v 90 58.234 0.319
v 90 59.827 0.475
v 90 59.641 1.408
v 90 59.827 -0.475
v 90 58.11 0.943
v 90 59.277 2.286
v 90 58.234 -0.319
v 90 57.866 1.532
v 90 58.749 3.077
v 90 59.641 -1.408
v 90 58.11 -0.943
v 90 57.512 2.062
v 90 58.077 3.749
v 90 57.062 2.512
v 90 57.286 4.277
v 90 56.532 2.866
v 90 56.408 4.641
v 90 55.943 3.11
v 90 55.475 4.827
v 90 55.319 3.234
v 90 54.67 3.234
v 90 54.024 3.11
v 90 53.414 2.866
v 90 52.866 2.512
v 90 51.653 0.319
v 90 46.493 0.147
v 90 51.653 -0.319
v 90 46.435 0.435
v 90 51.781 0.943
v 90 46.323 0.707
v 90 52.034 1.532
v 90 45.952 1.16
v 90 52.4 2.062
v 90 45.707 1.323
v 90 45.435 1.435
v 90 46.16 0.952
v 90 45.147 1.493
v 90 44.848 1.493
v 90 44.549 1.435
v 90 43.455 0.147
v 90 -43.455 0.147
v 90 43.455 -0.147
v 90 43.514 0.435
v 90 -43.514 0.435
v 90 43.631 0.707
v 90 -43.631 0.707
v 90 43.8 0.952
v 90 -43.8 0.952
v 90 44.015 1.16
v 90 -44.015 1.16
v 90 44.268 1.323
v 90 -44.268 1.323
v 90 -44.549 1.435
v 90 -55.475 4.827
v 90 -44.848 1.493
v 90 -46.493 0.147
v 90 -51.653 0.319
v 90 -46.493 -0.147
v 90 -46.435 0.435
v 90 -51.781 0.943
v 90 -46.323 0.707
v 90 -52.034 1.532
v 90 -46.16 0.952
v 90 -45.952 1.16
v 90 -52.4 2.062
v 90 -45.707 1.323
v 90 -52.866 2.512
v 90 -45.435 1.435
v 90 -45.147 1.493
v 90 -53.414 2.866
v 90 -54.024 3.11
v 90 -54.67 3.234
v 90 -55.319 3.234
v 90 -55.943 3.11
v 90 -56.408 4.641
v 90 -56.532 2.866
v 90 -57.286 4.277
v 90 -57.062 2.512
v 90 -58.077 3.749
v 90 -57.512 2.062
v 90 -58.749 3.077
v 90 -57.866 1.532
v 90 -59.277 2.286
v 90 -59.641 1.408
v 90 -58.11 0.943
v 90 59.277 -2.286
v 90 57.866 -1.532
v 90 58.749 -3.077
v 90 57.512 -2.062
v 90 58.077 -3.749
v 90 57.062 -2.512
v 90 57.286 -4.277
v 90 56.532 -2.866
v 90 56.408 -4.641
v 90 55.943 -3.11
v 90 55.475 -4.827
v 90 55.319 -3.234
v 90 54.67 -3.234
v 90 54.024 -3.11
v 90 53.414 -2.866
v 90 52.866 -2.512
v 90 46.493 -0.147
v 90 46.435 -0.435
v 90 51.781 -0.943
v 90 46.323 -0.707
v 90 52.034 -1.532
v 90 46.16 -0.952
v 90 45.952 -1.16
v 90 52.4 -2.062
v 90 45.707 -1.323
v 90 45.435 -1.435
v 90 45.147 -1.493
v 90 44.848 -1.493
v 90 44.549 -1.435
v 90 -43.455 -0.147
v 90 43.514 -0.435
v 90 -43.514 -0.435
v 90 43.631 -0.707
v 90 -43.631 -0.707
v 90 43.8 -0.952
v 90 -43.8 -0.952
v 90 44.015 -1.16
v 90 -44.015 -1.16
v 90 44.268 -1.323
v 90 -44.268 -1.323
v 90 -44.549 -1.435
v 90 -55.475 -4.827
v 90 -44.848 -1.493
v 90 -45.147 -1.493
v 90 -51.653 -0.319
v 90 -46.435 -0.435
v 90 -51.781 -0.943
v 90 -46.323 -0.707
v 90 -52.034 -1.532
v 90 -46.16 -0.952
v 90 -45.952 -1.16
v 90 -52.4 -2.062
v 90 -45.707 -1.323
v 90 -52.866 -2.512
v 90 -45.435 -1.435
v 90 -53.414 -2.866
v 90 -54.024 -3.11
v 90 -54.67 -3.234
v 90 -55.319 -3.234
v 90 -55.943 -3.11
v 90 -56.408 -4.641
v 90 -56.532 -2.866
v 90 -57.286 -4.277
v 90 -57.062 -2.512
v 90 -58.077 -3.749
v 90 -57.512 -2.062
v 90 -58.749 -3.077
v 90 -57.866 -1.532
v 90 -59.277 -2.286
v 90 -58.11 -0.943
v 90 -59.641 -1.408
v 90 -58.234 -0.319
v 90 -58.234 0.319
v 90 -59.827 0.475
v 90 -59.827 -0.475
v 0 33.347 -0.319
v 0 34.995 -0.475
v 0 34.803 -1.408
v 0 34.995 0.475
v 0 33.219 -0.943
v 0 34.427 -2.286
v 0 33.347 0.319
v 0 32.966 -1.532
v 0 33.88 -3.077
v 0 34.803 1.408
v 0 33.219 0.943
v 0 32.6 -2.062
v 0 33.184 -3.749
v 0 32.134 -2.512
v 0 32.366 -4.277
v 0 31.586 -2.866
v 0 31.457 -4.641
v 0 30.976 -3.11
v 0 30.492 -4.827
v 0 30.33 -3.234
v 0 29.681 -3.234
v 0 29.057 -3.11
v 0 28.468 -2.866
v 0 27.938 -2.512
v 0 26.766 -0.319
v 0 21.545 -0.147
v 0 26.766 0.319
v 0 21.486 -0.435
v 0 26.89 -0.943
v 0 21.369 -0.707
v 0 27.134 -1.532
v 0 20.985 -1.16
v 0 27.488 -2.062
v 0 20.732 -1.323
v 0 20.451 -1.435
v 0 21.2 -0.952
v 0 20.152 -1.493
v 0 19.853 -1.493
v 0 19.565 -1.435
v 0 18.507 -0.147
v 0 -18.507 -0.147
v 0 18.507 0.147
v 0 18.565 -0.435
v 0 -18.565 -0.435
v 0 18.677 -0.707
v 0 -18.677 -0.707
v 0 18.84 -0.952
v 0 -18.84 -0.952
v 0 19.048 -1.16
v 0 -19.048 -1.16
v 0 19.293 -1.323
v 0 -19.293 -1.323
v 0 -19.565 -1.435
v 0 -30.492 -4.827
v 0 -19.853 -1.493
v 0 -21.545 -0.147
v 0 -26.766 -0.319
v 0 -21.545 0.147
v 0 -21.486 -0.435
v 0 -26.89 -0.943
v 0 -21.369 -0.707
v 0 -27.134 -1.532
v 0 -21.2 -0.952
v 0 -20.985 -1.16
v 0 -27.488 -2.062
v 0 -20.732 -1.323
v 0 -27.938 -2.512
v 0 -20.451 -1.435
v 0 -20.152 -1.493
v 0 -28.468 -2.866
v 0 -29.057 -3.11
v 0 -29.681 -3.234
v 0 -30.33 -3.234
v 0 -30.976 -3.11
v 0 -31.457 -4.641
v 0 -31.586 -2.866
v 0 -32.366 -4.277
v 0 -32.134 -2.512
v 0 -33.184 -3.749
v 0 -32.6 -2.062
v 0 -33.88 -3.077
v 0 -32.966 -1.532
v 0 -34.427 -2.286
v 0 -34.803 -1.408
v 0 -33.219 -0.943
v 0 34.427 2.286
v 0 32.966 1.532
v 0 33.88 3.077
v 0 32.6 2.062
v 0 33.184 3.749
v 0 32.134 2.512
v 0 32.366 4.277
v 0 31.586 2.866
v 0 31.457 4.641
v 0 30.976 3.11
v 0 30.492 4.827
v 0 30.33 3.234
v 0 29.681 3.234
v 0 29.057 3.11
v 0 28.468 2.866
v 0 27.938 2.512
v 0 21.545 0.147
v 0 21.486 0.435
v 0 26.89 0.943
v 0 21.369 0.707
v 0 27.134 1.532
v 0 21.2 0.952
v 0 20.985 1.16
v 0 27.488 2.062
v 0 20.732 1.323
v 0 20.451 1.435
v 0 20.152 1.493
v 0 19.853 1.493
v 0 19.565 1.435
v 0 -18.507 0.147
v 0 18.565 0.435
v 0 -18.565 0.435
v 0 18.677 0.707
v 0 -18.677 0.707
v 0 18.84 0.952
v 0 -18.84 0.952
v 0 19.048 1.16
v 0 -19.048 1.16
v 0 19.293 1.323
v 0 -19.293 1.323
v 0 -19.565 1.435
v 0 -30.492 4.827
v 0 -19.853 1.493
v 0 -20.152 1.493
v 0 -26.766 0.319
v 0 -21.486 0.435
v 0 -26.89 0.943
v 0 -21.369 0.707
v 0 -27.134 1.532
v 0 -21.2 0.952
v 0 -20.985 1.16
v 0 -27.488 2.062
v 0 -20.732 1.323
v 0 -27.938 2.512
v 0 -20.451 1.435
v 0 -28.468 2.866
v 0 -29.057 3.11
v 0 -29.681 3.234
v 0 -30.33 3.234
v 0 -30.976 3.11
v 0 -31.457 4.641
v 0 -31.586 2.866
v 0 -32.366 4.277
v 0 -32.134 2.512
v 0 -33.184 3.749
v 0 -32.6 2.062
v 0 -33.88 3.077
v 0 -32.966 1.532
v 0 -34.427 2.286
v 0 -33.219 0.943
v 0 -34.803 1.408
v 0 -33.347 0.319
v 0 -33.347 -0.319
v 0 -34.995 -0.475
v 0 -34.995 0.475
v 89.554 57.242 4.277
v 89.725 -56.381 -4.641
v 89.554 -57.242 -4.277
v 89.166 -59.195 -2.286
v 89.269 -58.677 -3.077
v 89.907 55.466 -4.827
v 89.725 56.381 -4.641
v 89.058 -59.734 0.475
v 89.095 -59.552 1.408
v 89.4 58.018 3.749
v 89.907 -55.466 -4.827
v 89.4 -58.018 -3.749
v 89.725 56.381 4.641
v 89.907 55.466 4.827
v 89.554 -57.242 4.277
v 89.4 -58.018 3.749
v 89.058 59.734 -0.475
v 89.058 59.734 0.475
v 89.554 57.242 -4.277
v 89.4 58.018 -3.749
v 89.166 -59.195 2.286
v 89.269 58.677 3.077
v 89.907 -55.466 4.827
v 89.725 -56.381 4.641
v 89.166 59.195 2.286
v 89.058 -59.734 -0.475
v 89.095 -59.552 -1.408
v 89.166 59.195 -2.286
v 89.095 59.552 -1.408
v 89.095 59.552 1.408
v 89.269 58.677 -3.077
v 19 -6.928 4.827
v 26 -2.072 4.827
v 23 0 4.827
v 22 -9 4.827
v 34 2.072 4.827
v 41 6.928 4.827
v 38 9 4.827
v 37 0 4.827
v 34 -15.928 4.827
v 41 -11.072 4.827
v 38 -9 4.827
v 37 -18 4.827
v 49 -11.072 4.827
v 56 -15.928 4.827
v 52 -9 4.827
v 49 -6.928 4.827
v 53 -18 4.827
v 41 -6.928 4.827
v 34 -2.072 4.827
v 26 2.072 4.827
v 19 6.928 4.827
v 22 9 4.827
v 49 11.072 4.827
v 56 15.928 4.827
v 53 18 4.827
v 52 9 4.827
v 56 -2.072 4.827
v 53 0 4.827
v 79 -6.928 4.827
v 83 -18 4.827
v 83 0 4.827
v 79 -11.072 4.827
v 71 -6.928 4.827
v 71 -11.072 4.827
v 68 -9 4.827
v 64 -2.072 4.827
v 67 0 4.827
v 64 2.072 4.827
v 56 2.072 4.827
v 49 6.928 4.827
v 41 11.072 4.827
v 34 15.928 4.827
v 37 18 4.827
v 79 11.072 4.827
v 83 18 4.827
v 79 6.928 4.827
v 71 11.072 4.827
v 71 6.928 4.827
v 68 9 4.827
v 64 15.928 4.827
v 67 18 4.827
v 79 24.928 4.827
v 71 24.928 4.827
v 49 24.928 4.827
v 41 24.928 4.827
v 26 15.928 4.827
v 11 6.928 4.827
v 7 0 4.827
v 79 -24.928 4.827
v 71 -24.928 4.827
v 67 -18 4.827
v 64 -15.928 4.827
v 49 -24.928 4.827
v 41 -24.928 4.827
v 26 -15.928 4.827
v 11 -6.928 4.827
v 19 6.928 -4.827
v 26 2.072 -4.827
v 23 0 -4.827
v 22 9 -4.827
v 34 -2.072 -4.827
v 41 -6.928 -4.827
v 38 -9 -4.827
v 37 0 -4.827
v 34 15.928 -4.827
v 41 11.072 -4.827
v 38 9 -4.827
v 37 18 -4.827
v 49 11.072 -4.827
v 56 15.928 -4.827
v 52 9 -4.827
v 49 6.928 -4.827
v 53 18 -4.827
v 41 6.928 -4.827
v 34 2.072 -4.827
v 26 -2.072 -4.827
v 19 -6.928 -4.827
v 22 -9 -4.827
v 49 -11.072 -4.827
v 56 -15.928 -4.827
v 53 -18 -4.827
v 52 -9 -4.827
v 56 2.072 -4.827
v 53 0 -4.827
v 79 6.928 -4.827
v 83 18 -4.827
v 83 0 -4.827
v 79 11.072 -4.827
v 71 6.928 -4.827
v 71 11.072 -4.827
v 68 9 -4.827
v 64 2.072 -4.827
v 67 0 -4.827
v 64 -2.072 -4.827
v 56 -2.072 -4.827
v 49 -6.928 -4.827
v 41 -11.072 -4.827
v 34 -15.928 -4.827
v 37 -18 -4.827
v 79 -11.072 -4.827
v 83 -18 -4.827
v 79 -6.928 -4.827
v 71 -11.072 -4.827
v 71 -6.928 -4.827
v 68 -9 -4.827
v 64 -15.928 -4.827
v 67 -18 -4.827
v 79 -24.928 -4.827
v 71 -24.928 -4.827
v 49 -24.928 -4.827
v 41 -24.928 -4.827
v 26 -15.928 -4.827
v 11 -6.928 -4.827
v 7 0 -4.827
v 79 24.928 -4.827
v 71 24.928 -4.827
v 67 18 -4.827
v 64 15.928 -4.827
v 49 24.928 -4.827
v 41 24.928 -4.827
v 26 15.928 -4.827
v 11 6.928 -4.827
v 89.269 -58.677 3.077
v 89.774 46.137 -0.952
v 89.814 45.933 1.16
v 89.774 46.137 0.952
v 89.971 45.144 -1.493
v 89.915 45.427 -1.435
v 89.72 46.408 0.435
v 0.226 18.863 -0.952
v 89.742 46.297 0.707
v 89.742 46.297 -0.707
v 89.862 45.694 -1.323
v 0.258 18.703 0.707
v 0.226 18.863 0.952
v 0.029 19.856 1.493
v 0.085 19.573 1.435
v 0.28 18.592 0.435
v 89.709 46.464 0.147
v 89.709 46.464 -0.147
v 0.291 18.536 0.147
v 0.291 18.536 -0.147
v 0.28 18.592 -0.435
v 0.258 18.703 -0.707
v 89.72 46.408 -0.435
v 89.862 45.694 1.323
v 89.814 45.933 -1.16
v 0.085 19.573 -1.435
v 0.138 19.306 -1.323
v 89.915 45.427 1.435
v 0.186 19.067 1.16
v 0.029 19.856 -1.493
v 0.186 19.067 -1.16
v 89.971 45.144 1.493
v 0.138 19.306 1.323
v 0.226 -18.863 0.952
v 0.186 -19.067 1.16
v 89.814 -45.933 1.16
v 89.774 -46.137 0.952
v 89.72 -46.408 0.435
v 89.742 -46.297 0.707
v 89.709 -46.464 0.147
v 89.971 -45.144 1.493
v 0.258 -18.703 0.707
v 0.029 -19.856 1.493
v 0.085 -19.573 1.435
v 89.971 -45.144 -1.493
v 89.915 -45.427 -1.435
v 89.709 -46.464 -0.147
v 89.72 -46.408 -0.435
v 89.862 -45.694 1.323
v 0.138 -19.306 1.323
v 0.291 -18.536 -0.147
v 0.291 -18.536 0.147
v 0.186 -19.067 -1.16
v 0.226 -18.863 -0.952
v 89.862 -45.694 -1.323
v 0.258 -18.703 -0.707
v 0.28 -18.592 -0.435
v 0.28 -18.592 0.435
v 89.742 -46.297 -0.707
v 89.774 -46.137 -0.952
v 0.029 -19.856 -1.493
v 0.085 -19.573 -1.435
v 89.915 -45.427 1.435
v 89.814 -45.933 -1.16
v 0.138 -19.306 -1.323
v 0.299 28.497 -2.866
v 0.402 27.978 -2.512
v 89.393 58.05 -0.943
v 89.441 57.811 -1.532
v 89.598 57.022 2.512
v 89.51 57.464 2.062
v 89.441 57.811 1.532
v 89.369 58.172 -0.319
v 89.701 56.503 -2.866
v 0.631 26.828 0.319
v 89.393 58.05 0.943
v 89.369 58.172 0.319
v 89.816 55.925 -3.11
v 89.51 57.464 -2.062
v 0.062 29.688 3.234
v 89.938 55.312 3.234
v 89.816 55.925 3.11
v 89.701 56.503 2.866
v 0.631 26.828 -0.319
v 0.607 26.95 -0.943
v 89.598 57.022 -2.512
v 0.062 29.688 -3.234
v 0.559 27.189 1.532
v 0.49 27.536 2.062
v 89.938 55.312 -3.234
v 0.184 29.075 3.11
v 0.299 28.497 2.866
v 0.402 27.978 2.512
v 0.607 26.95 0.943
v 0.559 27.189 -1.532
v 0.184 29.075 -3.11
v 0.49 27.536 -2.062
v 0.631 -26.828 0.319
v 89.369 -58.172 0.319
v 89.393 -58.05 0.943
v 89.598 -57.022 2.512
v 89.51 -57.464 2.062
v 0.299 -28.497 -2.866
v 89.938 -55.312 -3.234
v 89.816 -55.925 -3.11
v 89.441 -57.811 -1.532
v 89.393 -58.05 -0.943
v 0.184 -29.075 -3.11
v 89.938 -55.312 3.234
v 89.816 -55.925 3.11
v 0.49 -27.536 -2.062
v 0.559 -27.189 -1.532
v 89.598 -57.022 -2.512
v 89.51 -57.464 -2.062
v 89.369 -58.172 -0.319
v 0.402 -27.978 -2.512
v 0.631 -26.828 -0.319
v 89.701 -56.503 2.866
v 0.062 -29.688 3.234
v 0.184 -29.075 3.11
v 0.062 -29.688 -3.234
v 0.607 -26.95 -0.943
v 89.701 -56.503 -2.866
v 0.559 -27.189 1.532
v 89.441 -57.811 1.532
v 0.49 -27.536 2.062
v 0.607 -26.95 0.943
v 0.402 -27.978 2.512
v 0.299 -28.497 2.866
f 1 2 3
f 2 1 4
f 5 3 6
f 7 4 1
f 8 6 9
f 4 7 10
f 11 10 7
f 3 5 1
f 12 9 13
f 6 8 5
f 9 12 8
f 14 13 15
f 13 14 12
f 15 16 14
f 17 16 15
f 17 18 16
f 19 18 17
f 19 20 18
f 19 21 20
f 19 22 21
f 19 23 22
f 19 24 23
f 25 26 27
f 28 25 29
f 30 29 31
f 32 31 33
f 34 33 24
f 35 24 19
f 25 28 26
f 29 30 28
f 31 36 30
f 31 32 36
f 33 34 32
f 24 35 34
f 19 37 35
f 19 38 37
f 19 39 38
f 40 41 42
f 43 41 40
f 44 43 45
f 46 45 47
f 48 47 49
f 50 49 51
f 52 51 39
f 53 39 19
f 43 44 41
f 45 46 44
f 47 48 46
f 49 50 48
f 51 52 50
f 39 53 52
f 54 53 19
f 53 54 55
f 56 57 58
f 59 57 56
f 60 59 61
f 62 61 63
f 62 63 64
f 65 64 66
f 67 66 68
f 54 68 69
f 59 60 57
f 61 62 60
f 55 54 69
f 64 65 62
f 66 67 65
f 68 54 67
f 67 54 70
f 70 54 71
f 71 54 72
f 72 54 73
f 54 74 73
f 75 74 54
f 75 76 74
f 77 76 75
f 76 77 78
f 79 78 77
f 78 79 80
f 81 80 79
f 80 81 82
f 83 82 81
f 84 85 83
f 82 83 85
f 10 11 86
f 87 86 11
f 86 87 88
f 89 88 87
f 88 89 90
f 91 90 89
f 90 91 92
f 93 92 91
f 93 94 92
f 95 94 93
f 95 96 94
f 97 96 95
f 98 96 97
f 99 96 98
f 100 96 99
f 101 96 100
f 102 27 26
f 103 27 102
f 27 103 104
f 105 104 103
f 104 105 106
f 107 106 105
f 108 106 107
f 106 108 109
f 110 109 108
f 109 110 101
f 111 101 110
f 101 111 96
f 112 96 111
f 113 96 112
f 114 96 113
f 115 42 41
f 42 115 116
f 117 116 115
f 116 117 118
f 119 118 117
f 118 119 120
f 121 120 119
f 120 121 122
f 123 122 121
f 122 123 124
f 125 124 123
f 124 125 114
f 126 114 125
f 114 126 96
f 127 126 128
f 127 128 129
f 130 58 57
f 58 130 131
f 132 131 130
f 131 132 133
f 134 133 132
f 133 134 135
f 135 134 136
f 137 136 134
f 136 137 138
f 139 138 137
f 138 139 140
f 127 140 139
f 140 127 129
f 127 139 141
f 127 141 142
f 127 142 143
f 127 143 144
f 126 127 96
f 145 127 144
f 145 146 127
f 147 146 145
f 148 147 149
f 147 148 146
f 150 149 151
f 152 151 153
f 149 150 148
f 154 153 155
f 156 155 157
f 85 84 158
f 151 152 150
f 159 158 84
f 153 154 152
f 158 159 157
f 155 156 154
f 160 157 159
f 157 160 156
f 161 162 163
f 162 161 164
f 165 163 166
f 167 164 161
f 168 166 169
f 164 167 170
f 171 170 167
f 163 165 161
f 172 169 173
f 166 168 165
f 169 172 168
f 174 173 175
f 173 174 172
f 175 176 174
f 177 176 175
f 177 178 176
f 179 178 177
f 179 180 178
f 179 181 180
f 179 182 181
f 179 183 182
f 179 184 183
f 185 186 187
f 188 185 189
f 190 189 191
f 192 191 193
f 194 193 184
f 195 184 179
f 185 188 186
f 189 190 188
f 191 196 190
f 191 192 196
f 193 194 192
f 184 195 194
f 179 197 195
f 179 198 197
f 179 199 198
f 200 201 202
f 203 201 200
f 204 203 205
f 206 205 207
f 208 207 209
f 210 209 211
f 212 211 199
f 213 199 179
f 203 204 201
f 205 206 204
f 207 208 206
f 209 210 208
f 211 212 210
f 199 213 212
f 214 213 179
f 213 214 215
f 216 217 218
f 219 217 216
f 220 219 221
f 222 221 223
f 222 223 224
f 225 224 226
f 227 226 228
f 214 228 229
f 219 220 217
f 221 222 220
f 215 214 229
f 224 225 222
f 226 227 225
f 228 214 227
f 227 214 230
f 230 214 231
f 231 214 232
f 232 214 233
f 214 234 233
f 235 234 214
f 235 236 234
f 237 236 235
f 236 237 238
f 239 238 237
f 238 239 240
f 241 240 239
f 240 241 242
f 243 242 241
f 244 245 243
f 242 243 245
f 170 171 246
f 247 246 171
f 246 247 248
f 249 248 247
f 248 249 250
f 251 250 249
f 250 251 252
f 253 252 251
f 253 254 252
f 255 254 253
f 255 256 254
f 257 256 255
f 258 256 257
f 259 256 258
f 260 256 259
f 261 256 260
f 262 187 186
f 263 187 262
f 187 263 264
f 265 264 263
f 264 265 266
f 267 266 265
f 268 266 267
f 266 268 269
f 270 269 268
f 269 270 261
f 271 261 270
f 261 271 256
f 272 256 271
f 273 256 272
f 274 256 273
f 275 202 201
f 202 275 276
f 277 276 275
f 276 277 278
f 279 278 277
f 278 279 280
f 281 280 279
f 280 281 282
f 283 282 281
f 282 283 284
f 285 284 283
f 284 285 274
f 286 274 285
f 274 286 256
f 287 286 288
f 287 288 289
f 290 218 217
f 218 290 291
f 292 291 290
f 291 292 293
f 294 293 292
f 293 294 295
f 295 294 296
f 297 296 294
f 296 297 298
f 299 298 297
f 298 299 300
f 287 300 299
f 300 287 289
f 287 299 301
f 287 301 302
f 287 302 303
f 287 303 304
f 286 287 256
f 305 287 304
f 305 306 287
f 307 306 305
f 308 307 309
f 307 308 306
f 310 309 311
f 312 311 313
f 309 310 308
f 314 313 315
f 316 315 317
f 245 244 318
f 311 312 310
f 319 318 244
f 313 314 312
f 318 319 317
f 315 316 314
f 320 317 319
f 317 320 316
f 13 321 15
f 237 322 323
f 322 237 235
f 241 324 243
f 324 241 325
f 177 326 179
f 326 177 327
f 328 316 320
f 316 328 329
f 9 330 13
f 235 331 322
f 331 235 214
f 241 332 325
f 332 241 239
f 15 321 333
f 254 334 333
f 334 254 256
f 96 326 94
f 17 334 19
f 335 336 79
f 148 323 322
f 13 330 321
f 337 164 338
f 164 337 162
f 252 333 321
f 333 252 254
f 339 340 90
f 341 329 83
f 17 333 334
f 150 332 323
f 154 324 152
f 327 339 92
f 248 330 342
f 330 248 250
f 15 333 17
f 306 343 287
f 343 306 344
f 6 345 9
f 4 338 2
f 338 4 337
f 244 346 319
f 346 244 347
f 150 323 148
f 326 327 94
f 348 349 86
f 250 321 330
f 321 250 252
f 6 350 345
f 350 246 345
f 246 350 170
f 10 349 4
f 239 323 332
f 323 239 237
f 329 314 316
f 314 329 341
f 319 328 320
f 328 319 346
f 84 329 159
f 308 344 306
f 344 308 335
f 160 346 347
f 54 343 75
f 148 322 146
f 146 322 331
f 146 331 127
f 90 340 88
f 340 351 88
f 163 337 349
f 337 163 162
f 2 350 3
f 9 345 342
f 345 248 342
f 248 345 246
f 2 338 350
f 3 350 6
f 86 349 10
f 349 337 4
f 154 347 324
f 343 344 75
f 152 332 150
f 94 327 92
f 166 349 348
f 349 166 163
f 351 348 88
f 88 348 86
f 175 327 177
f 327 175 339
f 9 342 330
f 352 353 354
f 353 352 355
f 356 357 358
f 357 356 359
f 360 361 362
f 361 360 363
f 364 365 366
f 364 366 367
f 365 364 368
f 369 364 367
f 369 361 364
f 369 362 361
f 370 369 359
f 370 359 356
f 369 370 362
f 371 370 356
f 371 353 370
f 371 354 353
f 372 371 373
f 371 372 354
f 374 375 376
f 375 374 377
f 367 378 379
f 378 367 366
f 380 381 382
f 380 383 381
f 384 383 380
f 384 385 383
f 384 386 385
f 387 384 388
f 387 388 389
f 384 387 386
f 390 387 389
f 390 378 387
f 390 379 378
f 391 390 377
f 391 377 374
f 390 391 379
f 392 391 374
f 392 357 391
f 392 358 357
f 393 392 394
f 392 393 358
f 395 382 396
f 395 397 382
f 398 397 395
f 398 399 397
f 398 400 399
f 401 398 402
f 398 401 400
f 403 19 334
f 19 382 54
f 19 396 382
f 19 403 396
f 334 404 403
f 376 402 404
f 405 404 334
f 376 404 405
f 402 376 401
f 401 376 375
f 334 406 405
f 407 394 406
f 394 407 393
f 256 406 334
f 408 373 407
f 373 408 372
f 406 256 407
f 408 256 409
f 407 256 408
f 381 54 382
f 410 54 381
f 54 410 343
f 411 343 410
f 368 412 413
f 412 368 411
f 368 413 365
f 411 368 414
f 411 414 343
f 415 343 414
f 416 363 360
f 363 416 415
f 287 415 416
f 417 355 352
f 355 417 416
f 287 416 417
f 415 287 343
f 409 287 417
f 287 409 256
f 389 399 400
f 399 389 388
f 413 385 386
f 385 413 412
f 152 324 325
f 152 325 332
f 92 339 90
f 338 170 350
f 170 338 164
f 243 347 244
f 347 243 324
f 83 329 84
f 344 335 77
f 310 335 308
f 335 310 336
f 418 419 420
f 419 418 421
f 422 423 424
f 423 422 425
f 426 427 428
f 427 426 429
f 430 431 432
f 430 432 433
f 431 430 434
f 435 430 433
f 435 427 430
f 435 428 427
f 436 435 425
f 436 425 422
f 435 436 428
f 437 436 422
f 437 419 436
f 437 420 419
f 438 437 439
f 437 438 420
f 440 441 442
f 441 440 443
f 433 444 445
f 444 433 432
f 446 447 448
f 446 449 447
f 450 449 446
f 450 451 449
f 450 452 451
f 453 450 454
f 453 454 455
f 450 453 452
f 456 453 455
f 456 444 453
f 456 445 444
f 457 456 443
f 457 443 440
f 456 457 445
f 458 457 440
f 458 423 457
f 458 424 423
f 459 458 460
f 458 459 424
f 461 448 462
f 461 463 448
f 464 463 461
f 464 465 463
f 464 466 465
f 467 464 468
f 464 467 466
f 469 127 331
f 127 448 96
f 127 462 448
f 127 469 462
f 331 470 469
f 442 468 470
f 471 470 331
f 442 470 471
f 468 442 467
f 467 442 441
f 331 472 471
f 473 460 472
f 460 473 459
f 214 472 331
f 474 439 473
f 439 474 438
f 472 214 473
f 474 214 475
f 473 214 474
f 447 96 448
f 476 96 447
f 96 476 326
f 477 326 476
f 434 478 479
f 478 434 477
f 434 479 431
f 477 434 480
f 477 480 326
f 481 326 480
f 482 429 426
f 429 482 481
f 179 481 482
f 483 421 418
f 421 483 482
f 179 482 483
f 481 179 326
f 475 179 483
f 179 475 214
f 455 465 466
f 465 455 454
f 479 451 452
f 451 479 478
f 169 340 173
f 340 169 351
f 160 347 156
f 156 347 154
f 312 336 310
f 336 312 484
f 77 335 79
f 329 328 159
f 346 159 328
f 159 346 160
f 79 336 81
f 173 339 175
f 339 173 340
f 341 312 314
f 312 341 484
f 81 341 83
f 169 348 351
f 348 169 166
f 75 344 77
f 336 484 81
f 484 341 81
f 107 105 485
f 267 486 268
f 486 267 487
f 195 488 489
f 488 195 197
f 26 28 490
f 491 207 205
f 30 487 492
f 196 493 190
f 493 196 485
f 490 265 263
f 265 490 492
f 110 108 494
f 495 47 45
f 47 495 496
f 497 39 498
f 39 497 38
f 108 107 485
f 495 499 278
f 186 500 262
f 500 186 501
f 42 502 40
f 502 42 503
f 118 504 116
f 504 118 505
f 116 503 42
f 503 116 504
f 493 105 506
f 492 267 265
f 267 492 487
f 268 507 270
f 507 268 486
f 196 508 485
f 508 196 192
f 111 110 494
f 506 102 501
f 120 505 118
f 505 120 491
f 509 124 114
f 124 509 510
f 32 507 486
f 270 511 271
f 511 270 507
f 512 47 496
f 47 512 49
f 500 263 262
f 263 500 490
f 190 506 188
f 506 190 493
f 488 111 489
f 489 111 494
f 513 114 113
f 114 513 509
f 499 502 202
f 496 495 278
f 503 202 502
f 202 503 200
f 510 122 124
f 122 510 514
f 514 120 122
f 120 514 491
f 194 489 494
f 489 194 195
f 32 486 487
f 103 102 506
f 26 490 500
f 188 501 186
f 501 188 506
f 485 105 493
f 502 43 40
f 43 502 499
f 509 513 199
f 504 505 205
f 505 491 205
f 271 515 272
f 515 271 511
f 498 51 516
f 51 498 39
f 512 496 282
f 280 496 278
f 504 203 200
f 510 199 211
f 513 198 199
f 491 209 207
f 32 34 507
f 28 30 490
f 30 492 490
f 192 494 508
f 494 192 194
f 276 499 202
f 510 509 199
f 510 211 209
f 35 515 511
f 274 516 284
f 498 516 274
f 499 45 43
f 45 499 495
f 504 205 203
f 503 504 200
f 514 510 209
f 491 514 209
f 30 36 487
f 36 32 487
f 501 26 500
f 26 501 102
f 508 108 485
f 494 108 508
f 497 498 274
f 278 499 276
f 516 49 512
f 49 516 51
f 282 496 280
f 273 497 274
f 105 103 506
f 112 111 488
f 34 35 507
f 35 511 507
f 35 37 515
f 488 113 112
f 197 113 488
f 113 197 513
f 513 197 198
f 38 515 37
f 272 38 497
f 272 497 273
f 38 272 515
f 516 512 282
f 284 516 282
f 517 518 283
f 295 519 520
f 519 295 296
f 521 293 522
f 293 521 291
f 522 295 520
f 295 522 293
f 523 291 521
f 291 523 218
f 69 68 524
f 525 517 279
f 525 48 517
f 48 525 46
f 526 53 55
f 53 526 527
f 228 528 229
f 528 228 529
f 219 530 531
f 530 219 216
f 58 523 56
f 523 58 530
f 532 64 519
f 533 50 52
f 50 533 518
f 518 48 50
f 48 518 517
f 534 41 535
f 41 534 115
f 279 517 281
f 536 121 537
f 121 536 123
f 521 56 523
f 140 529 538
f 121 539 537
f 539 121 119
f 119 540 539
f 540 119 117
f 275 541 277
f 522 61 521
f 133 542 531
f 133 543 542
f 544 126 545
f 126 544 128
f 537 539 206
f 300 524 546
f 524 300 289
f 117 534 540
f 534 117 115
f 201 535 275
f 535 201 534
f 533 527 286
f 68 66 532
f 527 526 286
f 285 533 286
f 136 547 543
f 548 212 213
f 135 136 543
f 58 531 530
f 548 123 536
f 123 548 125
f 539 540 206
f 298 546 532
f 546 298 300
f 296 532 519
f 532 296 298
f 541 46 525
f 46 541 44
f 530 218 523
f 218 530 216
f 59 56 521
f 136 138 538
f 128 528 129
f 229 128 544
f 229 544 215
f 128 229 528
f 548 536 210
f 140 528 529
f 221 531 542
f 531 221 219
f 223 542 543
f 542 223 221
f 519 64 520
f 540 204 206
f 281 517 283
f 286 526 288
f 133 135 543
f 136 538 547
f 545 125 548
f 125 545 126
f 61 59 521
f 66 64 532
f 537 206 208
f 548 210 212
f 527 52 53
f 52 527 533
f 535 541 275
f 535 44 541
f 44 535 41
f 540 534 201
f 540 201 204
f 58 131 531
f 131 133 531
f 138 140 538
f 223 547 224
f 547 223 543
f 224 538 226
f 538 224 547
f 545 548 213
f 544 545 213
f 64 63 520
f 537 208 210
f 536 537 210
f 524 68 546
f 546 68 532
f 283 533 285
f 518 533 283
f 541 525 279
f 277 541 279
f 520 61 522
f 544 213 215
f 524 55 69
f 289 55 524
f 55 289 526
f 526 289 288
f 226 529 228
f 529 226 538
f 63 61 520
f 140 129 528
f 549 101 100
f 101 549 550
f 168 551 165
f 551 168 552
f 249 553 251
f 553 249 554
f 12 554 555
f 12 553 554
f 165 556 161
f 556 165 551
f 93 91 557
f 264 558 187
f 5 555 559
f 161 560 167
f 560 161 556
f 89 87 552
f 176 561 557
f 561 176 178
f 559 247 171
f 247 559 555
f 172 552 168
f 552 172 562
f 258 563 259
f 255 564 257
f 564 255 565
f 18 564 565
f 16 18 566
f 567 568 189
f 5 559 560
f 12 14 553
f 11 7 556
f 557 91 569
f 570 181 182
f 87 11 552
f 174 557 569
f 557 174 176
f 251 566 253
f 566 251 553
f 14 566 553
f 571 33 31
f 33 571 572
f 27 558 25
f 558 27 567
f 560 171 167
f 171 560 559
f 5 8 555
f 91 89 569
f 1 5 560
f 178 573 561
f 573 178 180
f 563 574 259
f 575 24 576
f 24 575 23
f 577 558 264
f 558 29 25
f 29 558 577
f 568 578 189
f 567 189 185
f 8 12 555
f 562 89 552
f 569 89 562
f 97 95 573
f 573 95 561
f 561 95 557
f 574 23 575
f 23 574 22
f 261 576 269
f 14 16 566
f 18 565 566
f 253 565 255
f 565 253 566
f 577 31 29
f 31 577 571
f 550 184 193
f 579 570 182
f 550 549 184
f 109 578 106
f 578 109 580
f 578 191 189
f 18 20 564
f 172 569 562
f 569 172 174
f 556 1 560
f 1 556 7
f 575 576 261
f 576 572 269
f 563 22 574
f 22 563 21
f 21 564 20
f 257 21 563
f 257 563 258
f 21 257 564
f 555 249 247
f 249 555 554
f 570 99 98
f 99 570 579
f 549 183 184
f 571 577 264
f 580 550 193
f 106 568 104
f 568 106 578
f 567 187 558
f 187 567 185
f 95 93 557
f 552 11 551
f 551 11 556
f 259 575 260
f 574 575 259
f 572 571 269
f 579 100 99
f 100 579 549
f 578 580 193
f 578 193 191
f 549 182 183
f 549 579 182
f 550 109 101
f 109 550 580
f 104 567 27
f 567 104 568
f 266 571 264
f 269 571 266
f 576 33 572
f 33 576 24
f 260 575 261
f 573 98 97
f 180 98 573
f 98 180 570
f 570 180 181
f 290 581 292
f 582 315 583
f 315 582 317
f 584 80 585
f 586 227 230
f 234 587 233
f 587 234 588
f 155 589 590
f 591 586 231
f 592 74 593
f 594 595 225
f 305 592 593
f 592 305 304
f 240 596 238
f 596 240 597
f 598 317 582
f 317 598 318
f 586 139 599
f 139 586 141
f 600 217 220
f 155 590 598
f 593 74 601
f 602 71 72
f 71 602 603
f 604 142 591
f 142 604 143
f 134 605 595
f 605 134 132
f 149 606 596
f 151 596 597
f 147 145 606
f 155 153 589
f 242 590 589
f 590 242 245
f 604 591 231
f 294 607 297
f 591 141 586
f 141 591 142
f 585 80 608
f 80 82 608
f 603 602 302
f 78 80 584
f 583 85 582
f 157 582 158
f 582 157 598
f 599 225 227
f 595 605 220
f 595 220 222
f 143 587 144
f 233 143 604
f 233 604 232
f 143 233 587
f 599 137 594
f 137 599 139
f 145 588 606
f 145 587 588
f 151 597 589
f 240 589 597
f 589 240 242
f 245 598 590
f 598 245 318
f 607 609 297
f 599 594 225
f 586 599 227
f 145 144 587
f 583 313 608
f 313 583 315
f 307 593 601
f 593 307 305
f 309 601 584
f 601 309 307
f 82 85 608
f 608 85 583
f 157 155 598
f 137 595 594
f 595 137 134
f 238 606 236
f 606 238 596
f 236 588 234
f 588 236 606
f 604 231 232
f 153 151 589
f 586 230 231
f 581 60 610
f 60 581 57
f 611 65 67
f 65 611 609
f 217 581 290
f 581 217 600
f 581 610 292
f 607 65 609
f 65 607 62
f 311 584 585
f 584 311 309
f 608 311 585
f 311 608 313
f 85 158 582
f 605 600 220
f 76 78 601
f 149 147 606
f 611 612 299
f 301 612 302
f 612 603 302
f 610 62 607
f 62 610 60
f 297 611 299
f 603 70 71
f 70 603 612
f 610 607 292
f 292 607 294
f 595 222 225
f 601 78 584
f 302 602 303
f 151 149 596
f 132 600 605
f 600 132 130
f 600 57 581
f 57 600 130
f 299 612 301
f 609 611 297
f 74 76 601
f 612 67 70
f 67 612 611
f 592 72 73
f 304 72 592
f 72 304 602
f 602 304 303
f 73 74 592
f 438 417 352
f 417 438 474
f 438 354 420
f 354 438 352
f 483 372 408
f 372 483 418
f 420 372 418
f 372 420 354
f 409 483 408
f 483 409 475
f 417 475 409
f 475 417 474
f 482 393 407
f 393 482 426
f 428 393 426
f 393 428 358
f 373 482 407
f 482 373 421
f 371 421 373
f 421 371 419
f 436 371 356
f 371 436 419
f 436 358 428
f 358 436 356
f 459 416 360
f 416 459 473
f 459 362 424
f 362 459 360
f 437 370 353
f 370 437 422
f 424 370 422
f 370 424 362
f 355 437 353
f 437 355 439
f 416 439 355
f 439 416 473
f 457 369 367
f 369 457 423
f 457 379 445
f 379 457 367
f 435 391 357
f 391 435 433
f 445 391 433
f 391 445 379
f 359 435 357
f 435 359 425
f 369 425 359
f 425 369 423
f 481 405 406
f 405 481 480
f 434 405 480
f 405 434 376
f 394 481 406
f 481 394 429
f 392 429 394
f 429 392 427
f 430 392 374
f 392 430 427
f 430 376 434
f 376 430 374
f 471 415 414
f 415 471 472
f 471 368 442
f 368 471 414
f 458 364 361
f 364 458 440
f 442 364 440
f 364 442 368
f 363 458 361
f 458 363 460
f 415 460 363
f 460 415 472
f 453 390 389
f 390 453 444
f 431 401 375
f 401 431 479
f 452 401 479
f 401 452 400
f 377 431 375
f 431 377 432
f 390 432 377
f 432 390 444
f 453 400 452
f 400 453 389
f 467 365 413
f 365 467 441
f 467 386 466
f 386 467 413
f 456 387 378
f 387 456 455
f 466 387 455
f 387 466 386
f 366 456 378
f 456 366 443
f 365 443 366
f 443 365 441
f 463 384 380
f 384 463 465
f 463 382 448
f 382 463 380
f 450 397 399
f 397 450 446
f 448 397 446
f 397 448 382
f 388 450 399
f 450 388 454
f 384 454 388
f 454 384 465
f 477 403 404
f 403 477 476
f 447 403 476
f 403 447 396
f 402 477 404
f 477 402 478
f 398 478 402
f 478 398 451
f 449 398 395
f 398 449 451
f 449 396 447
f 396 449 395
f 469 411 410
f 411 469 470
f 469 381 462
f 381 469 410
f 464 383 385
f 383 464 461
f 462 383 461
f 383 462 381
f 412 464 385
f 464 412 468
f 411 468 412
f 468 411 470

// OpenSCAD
$fn=32;

sbr=1.5;
bbr=3.25;
tt=1.6;

difference() {
  hr=8;
  plate();
  armBarPath(sbr);
  mirror([0,1,0]) armBarPath(sbr);
  translate([0,10,0]) armBarPath(bbr);
  mirror([0,1,0]) translate([0,10,0])  armBarPath(bbr);
  translate([15,0,-5]) cylinder(r=hr,h=10,$fn=6);
  translate([30,9,-5]) cylinder(r=hr,h=10,$fn=6);
  translate([30,-9,-5]) cylinder(r=hr,h=10,$fn=6);

  translate([45,0,-5]) cylinder(r=hr,h=10,$fn=6);
  translate([45,18,-5]) cylinder(r=hr,h=10,$fn=6);
  translate([45,-18,-5]) cylinder(r=hr,h=10,$fn=6);

  translate([60,9,-5]) cylinder(r=hr,h=10,$fn=6);
  translate([60,-9,-5]) cylinder(r=hr,h=10,$fn=6);

  translate([75,0,-5]) cylinder(r=hr,h=10,$fn=6);
  translate([75,18,-5]) cylinder(r=hr,h=10,$fn=6);
  translate([75,-18,-5]) cylinder(r=hr,h=10,$fn=6);
}

module plate() {
  intersection() {
    translate([0,-100,-10]) cube([90,200,20]);
    hull() {
      translate([0,10,0]) armBarPath(bbr+tt);
      mirror([0,1,0]) translate([0,10,0])  armBarPath(bbr+tt);
    }
  }
}

module halfPlate() {
  intersection() {
    translate([0,-100,0]) cube([90,200,10]);
    hull() {
      translate([0,10,0]) armBarPath(bbr+1.2);
      mirror([0,1,0]) translate([0,10,0])  armBarPath(bbr+1.2);
    }
  }
}


module armBarPath(r) {
  hull() {
    translate([0,20,0]) sphere(r=r);
    translate([90,45,0]) sphere(r=r);
  }
}
